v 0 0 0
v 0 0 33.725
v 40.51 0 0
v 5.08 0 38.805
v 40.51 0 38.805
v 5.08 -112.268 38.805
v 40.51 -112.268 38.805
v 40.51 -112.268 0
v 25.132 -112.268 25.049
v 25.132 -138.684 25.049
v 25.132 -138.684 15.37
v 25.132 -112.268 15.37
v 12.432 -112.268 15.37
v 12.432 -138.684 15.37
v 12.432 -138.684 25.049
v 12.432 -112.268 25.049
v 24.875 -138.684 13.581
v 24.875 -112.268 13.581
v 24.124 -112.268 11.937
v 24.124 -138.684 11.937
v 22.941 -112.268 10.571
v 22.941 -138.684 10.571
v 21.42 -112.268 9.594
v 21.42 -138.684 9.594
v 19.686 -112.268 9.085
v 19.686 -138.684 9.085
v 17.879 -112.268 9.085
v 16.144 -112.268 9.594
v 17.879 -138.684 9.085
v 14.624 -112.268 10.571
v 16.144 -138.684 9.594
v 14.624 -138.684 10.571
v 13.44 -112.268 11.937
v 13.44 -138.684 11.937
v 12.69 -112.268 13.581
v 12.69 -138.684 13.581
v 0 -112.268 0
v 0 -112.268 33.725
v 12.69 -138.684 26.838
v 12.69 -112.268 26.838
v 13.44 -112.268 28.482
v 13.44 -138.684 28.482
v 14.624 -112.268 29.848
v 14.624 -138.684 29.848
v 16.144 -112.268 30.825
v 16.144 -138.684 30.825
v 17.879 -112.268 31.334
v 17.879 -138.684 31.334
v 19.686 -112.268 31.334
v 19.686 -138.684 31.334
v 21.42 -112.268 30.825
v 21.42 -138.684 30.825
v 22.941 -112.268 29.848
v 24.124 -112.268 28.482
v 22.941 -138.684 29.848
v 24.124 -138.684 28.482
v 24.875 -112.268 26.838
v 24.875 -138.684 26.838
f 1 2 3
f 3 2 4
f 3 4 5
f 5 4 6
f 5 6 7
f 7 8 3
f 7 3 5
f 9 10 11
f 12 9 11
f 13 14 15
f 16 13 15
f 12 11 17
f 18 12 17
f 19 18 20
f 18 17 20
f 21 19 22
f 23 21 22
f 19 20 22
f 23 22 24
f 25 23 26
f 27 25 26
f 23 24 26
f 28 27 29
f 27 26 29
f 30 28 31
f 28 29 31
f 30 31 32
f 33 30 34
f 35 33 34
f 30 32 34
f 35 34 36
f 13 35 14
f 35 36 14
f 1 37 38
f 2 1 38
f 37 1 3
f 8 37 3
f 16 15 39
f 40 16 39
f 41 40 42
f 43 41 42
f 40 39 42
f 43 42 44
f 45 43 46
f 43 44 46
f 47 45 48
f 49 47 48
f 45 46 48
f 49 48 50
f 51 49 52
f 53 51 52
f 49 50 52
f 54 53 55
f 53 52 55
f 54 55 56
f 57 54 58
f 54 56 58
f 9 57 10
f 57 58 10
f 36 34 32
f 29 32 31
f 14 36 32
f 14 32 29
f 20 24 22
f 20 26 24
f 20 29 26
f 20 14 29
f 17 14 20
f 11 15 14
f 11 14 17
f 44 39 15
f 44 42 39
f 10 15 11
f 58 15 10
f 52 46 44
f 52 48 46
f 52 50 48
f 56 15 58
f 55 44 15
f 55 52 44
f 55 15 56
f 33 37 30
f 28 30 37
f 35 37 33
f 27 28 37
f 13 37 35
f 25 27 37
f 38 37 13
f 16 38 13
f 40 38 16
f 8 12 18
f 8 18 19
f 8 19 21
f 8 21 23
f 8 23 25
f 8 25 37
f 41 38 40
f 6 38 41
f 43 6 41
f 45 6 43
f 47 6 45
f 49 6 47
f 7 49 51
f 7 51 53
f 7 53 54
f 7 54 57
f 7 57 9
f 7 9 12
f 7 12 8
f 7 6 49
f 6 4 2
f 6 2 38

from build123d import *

# Parameters (mm, degrees)
F0_W     = 40.5096374452
F0_H     = 38.8049148023
F1_DEPTH = 138.684
F2_SIZE  = 5.08
F5_DEPTH = 26.416


with BuildPart() as f1:
    # F0 (on Front) → F1 (new body)
    with BuildSketch(Plane.XZ):
        with Locations((20.2548187226, 19.4024574012)):
            Rectangle(F0_W, F0_H)
    extrude(amount=F1_DEPTH)

    # F2
    f2_edges = [f1.edges().sort_by_distance(p)[0] for p in [
        (0, -69.342, 38.804915),
    ]]
    chamfer(f2_edges, length=F2_SIZE)

    # F4 (on face) → F5 (cut)
    with BuildSketch(Plane.XZ.offset(138.684)):
        Polygon((40.5096374452, 38.8049148023), (5.08, 38.8049148023), (0, 33.7249148023), (0, 0), (40.5096374452, 0), align=None)
        with BuildLine():
            Line((12.4323120505, 15.3702050447), (12.4323120505, 25.048552081))
            ThreePointArc((12.4323120505, 25.048552081), (18.7823120505, 31.398552081), (25.1323120505, 25.048552081))
            Line((25.1323120505, 25.048552081), (25.1323120505, 15.3702050447))
            ThreePointArc((25.1323120505, 15.3702050447), (18.7823120505, 9.0202050447), (12.4323120505, 15.3702050447))
        make_face(mode=Mode.SUBTRACT)
    extrude(amount=-F5_DEPTH, mode=Mode.SUBTRACT)


solid = f1.part
